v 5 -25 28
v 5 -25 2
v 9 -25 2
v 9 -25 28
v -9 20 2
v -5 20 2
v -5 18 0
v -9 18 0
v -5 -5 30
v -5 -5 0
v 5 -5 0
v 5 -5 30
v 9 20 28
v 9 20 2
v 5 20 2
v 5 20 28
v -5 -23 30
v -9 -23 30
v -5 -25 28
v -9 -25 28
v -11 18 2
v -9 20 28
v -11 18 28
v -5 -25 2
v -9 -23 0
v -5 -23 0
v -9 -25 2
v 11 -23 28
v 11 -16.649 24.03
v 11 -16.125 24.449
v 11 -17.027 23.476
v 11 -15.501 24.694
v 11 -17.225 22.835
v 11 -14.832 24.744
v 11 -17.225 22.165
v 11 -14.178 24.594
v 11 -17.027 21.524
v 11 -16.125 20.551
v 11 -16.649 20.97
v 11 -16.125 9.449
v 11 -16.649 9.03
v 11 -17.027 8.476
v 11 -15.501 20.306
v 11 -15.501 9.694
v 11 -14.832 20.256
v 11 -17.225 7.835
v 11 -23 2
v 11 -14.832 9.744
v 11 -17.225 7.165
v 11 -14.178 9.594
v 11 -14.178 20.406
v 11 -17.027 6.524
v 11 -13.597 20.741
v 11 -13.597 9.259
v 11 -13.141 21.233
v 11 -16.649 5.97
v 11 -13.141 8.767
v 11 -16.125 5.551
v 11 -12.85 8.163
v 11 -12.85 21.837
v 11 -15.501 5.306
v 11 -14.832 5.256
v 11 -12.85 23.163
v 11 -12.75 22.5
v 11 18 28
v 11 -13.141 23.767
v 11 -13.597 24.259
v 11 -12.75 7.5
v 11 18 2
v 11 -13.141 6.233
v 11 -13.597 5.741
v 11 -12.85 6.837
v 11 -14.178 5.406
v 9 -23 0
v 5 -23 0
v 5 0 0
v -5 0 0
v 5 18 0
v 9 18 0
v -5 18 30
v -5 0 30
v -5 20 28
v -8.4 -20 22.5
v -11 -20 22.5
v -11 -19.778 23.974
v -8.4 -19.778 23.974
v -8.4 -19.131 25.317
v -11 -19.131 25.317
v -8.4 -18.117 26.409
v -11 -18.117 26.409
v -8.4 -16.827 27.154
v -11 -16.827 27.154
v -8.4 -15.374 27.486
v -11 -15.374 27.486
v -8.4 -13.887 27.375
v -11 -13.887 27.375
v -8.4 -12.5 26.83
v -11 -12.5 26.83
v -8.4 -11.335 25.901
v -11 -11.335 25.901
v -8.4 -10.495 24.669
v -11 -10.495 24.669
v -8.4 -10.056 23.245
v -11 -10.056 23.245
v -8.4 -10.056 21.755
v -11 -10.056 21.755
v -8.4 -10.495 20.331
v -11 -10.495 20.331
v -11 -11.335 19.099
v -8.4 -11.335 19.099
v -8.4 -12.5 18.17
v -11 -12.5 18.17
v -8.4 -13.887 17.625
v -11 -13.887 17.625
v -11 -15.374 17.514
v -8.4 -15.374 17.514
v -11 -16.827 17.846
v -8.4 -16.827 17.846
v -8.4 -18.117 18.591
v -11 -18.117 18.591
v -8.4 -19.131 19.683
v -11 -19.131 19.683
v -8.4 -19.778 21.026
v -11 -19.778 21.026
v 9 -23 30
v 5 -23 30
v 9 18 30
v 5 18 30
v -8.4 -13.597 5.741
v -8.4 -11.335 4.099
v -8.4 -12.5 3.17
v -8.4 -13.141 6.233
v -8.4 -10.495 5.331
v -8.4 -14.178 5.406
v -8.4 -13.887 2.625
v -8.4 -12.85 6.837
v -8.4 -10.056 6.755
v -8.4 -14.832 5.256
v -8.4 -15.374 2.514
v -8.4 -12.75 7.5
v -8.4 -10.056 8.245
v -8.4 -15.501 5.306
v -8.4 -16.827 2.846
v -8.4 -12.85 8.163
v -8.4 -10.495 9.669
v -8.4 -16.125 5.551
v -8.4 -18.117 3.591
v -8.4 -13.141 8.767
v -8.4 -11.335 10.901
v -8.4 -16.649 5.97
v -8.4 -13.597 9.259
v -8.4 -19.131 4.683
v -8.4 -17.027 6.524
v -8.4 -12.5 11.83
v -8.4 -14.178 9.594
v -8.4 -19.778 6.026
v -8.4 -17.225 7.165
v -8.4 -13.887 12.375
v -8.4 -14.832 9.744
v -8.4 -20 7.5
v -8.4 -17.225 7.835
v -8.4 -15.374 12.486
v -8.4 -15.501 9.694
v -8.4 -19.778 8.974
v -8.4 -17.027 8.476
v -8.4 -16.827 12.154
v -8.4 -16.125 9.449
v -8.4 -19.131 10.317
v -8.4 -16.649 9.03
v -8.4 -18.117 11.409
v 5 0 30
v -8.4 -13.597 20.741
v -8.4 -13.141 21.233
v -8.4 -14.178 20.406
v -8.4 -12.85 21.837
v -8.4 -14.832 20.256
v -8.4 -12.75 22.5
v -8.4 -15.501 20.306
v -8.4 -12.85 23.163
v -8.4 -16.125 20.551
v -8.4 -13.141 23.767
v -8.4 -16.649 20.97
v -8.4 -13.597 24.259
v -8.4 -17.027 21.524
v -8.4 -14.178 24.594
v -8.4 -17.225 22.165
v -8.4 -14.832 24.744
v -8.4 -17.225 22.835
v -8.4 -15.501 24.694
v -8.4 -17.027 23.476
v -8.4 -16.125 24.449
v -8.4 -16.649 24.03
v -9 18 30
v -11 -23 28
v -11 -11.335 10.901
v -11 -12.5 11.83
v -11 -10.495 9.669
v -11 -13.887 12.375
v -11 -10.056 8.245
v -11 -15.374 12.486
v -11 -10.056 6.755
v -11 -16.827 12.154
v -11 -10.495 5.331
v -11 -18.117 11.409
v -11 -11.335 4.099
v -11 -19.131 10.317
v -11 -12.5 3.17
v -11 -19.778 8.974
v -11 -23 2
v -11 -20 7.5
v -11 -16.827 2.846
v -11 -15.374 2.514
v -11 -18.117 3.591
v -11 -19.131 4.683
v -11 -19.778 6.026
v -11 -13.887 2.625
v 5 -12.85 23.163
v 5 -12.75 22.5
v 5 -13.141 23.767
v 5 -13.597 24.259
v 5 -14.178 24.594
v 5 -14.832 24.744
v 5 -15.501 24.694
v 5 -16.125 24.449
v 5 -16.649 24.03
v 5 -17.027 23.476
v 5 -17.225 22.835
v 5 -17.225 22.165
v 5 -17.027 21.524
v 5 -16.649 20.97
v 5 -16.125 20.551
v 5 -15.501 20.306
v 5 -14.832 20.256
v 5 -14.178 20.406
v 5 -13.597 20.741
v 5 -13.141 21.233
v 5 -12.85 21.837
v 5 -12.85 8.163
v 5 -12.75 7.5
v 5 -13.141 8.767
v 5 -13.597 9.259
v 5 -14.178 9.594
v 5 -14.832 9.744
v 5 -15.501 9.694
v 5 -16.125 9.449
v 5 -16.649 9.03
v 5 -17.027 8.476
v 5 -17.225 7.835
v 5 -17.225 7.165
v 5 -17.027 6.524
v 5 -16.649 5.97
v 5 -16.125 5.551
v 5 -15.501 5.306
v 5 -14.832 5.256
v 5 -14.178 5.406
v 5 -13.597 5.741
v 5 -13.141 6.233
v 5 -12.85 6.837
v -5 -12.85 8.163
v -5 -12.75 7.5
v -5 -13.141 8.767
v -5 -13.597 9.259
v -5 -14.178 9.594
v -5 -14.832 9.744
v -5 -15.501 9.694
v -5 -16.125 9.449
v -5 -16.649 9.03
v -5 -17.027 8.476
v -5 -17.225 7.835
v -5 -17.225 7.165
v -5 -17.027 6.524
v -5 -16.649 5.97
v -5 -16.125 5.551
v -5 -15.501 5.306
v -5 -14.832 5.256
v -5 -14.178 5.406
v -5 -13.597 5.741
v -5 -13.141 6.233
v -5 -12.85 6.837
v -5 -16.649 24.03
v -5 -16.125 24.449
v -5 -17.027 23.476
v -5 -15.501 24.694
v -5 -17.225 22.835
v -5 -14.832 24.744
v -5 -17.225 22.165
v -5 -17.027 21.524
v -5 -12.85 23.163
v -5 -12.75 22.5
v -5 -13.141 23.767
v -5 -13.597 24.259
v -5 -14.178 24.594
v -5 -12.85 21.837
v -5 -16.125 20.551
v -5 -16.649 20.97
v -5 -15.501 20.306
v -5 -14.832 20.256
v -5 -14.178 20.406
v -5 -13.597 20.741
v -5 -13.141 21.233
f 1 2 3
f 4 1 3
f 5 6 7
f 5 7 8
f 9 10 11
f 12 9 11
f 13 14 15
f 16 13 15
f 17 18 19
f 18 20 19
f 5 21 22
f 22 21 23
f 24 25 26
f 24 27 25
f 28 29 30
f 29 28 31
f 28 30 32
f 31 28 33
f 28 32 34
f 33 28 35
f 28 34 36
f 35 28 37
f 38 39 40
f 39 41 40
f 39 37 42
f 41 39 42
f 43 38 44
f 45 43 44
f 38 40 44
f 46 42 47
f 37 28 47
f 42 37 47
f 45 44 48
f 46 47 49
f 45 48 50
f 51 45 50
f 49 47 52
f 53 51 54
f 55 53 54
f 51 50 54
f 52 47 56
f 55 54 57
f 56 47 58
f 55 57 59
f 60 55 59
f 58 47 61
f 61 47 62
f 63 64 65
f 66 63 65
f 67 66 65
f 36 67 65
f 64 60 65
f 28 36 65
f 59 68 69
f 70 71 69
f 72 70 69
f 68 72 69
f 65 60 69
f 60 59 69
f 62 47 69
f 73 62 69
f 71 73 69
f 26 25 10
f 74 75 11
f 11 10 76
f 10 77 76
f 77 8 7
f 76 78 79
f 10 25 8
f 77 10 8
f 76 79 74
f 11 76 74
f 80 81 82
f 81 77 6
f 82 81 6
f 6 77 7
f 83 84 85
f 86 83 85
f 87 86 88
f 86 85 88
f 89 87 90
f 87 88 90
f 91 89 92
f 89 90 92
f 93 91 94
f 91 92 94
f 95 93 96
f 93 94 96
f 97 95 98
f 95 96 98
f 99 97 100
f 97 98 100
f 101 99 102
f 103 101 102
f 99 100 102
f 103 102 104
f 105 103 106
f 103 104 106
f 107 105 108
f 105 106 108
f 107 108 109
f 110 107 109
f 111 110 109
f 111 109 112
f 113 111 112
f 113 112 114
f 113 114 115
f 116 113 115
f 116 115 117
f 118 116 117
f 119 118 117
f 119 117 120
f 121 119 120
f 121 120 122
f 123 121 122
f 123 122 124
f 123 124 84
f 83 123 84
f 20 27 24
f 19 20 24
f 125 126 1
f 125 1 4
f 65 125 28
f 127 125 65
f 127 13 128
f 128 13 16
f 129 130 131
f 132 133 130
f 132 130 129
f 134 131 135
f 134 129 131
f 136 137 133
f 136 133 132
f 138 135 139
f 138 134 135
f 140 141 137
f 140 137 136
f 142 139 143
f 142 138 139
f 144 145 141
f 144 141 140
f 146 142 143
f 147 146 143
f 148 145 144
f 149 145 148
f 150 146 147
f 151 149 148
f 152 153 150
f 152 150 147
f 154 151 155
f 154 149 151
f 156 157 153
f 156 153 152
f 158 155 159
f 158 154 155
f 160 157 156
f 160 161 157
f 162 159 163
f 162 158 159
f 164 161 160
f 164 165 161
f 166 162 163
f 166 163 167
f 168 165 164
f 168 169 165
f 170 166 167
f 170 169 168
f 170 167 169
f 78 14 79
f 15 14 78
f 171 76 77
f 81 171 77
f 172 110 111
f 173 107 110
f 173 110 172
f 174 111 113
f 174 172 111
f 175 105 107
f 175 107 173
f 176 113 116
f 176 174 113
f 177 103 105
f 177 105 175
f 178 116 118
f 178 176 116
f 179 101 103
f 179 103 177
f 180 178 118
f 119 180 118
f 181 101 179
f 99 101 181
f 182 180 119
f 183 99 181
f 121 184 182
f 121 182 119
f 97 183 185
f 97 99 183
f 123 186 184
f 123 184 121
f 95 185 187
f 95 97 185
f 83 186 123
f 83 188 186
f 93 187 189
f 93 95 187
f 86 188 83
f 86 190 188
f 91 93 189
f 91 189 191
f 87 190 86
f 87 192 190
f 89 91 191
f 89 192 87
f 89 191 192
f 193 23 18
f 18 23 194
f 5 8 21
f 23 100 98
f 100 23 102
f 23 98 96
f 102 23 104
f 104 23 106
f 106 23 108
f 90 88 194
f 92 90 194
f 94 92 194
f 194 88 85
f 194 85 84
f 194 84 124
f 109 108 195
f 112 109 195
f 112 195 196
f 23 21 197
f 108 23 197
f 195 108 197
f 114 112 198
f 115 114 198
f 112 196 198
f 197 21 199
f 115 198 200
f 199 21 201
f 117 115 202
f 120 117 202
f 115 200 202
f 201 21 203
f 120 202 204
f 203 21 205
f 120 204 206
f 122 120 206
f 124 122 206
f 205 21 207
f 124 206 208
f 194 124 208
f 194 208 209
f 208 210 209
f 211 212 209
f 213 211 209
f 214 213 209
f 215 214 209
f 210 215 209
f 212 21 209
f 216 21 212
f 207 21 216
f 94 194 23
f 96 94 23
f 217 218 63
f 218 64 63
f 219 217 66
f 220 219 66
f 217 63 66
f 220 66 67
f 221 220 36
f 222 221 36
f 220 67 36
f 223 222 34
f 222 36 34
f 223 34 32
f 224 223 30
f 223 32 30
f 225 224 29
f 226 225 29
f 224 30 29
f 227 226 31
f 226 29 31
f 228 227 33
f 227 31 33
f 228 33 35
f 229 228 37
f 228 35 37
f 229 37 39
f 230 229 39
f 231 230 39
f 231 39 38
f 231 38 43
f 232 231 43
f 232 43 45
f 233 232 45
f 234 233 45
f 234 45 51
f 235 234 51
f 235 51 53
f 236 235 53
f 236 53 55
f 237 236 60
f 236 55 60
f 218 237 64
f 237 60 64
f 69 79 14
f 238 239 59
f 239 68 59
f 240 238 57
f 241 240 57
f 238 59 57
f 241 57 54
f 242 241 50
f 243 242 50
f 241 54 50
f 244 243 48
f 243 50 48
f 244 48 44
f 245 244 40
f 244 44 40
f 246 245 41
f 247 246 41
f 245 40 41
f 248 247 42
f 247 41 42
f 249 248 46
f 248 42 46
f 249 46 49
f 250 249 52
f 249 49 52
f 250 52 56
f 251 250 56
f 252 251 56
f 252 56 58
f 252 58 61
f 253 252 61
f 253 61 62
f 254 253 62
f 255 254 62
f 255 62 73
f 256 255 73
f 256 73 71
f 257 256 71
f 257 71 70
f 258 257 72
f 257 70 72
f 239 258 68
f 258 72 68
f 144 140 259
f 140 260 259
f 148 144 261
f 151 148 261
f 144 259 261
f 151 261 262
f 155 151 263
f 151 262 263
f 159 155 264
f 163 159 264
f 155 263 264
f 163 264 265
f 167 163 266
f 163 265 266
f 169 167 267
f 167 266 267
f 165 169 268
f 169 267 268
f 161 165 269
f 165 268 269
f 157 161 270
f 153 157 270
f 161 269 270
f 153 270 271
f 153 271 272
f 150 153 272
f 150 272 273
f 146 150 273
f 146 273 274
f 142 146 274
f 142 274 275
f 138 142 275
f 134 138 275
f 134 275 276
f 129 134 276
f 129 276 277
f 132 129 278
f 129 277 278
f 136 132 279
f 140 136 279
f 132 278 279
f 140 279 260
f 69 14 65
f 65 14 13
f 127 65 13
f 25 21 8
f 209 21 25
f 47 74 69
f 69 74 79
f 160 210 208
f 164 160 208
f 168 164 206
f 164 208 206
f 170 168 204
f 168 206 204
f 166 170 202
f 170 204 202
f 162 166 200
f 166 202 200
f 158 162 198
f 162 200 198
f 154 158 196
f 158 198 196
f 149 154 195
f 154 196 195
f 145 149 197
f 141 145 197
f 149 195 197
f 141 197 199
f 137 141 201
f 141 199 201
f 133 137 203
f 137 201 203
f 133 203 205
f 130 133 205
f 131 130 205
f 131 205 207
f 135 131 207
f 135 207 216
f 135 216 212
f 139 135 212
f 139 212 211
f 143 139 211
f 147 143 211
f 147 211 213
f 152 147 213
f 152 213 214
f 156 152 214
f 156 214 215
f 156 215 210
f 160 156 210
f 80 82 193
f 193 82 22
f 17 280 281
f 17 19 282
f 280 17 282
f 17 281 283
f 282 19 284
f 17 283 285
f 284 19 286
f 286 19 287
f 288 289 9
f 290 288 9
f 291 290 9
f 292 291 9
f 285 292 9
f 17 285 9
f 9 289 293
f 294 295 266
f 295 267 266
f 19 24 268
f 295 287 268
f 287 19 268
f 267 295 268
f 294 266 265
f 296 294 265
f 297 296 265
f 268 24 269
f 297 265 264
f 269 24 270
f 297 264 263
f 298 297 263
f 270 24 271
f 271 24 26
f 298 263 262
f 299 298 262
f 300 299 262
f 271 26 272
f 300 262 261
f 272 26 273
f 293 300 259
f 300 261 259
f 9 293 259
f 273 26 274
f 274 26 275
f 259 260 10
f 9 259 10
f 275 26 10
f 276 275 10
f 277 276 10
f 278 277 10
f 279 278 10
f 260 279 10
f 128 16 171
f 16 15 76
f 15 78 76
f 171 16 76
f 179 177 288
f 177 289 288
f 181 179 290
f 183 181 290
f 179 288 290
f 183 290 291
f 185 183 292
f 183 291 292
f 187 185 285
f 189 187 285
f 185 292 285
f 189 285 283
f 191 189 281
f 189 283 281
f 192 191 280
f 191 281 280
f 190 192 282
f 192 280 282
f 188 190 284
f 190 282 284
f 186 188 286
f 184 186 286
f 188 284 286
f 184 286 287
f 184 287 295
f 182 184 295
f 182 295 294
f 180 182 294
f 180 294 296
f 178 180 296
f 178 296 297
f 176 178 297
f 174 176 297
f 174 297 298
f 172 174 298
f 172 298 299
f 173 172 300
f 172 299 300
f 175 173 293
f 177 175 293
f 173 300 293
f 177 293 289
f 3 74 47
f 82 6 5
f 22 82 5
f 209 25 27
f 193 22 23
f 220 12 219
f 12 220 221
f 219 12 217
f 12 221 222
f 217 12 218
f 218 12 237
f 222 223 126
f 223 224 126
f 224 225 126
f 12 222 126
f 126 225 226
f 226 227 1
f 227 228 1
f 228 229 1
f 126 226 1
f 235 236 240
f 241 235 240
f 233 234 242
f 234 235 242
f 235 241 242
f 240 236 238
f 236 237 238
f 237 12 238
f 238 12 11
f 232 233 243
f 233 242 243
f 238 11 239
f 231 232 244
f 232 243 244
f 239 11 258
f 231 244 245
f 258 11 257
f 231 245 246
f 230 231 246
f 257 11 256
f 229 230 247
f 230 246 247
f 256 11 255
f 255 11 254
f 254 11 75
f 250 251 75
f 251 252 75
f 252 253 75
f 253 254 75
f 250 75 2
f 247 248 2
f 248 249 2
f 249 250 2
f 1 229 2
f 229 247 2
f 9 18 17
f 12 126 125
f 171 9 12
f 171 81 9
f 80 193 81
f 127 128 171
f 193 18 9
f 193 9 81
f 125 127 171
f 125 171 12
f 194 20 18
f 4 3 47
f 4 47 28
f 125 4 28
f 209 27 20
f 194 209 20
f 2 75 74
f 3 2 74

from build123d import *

# Parameters (mm, degrees)
ESTRUSIONE_ESTRUSIONE1_DEPTH                         = 30
FORO_LAMATO_PER_VITE_M4_A_TESTA_CILINDRI_D           = 4.5
FORO_LAMATO_PER_VITE_M4_A_TESTA_CILINDRI_DEPTH       = 30
FORO_LAMATO_PER_VITE_M4_A_TESTA_CILINDRI_CBORE_D     = 10
FORO_LAMATO_PER_VITE_M4_A_TESTA_CILINDRI_CBORE_DEPTH = 2.6
FORO_LAMATO_PER_VITE_M4_A_TESTA_CILINDRI_TIP         = 1.351936393
SMUSSO1_SIZE                                         = 2


with BuildPart() as part:
    # Schizzo1 → Estrusione-Estrusione1 (new body)
    with BuildSketch(Plane.XY):
        Polygon((11, -25), (11, 20), (5, 20), (5, 0), (-5, 0), (-5, 20), (-11, 20), (-11, -25), (-5, -25), (-5, -5), (5, -5), (5, -25), align=None)
    extrude(amount=ESTRUSIONE_ESTRUSIONE1_DEPTH)

    # Foro lamato per Vite M4 a testa cilindrica piana-1
    with Locations(Plane(origin=(-11, -15, 22.5), x_dir=(0, -1, 0), z_dir=(-1, 0, 0))):
        with Locations((0, 0), (0, -15)):
            CounterBoreHole(FORO_LAMATO_PER_VITE_M4_A_TESTA_CILINDRI_D / 2, FORO_LAMATO_PER_VITE_M4_A_TESTA_CILINDRI_CBORE_D / 2, FORO_LAMATO_PER_VITE_M4_A_TESTA_CILINDRI_CBORE_DEPTH, depth=FORO_LAMATO_PER_VITE_M4_A_TESTA_CILINDRI_DEPTH)
            with Locations((0, 0, -(FORO_LAMATO_PER_VITE_M4_A_TESTA_CILINDRI_DEPTH + FORO_LAMATO_PER_VITE_M4_A_TESTA_CILINDRI_TIP / 2))):  # 118° drill point
                Cone(0, FORO_LAMATO_PER_VITE_M4_A_TESTA_CILINDRI_D / 2, FORO_LAMATO_PER_VITE_M4_A_TESTA_CILINDRI_TIP, mode=Mode.SUBTRACT)

    # Smusso1
    smusso1_edges = [part.edges().sort_by_distance(p)[0] for p in [
        (-8, -25, 30),
        (8, 20, 0),
        (11, -2.5, 0),
        (8, -25, 0),
        (-8, -25, 0),
        (-11, -2.5, 0),
        (-8, 20, 0),
        (11, 20, 15),
        (11, -25, 15),
        (-11, -25, 15),
        (-11, 20, 15),
        (8, -25, 30),
        (11, -2.5, 30),
        (8, 20, 30),
        (-8, 20, 30),
        (-11, -2.5, 30),
    ]]
    chamfer(smusso1_edges, length=SMUSSO1_SIZE)


solid = part.part
